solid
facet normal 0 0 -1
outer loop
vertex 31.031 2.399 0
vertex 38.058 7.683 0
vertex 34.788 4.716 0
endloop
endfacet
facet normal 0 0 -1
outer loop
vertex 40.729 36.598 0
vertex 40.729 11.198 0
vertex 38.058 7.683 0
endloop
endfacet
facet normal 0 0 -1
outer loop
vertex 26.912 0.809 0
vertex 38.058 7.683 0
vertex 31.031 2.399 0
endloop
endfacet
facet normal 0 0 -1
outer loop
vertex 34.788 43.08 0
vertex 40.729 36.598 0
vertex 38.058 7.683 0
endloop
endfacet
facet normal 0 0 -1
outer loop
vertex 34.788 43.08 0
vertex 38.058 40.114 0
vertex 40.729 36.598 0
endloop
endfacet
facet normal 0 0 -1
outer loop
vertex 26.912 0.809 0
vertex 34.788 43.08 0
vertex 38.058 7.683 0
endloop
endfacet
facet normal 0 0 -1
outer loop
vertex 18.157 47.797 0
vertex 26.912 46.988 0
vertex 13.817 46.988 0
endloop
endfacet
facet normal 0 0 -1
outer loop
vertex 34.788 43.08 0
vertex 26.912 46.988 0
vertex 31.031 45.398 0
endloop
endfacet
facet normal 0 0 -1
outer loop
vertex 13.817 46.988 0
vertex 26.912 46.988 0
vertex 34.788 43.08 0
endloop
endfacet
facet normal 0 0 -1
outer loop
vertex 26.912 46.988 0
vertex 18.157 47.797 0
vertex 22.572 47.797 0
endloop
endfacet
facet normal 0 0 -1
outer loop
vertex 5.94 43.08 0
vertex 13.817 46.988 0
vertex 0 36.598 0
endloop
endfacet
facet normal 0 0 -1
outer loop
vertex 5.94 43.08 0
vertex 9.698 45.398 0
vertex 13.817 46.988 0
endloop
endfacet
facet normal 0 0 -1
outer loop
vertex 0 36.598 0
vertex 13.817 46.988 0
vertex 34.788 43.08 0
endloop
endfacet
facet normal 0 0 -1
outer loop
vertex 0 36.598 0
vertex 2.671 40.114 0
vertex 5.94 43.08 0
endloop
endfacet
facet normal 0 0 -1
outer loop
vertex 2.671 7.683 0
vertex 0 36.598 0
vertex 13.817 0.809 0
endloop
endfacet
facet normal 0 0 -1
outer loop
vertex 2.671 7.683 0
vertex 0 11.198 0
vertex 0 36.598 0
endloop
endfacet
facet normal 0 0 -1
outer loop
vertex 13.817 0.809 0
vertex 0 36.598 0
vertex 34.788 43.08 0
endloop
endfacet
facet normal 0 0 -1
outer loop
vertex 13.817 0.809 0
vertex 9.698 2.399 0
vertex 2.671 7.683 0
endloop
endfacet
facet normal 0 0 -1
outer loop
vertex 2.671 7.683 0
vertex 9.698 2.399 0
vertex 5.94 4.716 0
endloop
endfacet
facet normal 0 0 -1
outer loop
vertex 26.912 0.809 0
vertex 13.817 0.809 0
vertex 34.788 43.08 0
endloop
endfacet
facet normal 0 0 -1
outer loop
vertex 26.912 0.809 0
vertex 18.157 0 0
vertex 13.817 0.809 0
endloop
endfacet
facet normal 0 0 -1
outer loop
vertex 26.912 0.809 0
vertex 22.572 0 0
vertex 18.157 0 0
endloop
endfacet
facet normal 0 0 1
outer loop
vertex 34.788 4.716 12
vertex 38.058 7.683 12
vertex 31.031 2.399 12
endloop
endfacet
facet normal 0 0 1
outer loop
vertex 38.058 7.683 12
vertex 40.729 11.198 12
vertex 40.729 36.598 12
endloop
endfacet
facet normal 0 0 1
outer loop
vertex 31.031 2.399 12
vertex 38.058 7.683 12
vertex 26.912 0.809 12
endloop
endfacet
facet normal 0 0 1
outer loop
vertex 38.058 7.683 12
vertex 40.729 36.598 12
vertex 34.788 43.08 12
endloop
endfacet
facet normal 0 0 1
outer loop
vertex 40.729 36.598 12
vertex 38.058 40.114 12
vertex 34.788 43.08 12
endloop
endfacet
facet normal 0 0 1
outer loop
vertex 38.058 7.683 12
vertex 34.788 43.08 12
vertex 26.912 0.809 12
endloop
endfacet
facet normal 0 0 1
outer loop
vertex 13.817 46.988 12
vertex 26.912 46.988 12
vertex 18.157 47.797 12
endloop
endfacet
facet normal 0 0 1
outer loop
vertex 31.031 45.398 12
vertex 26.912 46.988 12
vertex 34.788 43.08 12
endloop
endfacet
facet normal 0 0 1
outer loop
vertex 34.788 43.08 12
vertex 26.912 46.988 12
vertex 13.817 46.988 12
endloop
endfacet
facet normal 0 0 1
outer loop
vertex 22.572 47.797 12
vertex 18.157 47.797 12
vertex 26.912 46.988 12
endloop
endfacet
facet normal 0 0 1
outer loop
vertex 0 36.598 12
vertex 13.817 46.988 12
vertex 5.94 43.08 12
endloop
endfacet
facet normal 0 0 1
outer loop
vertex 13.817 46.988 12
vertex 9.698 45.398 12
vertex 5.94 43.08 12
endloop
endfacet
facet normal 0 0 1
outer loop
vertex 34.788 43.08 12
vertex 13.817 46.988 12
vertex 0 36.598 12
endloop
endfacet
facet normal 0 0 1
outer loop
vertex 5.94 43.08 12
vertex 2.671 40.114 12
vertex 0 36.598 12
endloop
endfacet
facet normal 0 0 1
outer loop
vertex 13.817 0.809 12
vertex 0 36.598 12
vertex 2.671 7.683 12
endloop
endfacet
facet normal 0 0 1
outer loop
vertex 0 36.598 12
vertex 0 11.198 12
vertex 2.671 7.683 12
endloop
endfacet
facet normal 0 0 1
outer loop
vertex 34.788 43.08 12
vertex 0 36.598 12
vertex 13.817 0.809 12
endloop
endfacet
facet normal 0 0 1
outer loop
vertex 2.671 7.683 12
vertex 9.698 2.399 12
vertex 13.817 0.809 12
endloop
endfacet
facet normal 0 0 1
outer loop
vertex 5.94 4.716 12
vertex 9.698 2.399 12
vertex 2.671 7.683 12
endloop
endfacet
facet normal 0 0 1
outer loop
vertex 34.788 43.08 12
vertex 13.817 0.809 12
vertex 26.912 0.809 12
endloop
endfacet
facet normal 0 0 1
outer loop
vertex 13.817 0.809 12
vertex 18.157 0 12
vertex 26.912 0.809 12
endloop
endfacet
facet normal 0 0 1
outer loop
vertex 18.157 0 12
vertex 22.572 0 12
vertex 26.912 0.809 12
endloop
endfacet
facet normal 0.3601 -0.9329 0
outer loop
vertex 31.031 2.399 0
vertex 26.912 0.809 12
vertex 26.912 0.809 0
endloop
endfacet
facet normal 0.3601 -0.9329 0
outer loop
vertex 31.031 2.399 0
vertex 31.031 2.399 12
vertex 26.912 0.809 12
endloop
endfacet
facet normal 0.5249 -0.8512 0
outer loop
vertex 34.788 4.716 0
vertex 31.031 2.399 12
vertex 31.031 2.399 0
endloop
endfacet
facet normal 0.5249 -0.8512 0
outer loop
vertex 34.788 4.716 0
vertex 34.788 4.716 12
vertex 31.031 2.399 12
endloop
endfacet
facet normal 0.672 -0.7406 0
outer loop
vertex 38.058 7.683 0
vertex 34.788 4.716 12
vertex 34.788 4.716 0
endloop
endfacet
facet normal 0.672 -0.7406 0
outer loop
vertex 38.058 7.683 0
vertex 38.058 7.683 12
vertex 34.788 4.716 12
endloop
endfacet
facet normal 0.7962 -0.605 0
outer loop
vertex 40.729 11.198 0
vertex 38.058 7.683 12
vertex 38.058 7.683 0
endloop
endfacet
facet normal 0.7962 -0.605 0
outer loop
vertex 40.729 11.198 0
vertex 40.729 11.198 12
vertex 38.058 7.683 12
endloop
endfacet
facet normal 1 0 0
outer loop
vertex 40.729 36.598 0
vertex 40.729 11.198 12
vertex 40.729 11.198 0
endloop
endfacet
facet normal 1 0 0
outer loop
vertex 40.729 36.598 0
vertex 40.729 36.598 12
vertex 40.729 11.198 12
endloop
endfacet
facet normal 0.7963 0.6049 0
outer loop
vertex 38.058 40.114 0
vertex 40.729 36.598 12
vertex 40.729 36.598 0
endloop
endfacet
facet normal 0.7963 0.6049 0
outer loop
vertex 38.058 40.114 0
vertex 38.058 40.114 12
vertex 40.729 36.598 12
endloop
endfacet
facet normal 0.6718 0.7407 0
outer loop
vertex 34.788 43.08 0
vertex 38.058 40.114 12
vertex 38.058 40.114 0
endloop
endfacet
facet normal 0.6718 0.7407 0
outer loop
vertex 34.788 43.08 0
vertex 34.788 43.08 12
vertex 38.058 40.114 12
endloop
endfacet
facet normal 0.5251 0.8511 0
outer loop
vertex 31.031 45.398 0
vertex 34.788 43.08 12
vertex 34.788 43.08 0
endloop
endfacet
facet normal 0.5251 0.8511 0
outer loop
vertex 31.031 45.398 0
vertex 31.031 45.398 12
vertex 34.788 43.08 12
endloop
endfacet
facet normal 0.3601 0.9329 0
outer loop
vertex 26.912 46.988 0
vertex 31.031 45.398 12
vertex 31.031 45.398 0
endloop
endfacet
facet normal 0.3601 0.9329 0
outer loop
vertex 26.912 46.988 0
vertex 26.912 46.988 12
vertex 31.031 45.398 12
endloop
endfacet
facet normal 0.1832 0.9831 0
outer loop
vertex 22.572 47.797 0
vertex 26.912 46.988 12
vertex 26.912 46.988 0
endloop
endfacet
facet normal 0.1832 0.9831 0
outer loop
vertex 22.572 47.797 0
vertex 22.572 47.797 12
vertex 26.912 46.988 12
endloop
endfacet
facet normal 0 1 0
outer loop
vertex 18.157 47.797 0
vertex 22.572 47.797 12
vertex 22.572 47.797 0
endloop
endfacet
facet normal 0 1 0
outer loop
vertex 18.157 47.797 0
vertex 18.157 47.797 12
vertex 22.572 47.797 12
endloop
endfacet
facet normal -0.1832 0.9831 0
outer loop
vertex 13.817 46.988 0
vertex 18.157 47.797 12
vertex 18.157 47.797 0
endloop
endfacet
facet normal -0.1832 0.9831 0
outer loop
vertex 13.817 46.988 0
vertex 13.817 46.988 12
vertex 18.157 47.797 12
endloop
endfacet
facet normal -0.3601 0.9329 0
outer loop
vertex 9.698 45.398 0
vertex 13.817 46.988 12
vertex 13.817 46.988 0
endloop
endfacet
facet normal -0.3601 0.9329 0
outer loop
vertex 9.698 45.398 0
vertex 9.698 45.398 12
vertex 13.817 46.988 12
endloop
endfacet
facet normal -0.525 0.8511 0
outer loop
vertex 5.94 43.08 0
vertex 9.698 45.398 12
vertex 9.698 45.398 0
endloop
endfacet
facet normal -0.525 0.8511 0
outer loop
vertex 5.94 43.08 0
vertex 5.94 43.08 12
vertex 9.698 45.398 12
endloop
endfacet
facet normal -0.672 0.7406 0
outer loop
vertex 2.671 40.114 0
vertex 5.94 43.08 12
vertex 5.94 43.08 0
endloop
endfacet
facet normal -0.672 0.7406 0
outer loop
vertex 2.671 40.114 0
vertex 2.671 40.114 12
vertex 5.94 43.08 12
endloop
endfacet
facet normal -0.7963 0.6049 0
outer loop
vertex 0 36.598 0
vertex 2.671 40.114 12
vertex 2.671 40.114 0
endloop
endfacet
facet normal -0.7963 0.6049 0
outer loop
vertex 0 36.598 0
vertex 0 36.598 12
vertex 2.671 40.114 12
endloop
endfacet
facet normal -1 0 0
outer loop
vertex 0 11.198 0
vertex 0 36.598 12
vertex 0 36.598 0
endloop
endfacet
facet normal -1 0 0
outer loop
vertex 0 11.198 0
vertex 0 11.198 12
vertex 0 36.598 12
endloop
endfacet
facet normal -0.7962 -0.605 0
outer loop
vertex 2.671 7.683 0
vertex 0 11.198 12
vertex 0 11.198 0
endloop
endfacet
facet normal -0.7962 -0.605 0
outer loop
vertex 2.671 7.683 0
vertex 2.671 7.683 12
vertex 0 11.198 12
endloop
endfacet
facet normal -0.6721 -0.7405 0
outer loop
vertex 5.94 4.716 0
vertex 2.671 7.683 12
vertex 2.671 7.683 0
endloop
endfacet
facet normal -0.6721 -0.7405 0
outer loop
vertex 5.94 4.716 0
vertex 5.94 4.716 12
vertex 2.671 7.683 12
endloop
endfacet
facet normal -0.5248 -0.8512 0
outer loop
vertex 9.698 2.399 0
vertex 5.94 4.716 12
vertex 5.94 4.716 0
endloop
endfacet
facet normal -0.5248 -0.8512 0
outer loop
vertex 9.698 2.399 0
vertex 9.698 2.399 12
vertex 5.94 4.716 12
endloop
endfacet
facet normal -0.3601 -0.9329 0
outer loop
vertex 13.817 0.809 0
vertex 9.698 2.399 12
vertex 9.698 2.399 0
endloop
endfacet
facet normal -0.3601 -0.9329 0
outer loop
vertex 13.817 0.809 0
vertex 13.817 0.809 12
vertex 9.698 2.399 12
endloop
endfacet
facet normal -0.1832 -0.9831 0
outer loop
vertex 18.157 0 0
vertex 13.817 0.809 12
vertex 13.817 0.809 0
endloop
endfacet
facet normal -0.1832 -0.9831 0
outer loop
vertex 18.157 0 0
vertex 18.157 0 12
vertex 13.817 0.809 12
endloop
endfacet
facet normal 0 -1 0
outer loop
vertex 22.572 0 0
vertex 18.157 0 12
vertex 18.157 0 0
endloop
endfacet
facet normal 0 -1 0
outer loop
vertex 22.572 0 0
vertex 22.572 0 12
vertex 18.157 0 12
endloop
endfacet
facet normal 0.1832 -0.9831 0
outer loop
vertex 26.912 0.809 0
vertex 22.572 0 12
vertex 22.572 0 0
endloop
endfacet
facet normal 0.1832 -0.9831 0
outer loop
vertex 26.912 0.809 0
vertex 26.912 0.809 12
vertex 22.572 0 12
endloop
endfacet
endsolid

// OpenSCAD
$fn = 32;

// ----------------------------------------------------------------------
// Flat adaptor: double_d, 12 mm thick
// ----------------------------------------------------------------------

// --- parameters (mm) ---
profile_height = 12;      // extrusion height
profile_points = 24;      // points of the closed outline

profile = [[40.729, 36.598], [38.058, 40.114], [34.788, 43.08], [31.031, 45.398], [26.912, 46.988], [22.572, 47.797], [18.157, 47.797], [13.817, 46.988], [9.698, 45.398], [5.94, 43.08], [2.671, 40.114], [0, 36.598], [0, 11.198], [2.671, 7.683], [5.94, 4.716], [9.698, 2.399], [13.817, 0.809], [18.157, 0], [22.572, 0], [26.912, 0.809], [31.031, 2.399], [34.788, 4.716], [38.058, 7.683], [40.729, 11.198]];  // single closed polygon, 24 points, counter clockwise

// --- the one profile operation ---
linear_extrude(height = profile_height) polygon(points = profile);
